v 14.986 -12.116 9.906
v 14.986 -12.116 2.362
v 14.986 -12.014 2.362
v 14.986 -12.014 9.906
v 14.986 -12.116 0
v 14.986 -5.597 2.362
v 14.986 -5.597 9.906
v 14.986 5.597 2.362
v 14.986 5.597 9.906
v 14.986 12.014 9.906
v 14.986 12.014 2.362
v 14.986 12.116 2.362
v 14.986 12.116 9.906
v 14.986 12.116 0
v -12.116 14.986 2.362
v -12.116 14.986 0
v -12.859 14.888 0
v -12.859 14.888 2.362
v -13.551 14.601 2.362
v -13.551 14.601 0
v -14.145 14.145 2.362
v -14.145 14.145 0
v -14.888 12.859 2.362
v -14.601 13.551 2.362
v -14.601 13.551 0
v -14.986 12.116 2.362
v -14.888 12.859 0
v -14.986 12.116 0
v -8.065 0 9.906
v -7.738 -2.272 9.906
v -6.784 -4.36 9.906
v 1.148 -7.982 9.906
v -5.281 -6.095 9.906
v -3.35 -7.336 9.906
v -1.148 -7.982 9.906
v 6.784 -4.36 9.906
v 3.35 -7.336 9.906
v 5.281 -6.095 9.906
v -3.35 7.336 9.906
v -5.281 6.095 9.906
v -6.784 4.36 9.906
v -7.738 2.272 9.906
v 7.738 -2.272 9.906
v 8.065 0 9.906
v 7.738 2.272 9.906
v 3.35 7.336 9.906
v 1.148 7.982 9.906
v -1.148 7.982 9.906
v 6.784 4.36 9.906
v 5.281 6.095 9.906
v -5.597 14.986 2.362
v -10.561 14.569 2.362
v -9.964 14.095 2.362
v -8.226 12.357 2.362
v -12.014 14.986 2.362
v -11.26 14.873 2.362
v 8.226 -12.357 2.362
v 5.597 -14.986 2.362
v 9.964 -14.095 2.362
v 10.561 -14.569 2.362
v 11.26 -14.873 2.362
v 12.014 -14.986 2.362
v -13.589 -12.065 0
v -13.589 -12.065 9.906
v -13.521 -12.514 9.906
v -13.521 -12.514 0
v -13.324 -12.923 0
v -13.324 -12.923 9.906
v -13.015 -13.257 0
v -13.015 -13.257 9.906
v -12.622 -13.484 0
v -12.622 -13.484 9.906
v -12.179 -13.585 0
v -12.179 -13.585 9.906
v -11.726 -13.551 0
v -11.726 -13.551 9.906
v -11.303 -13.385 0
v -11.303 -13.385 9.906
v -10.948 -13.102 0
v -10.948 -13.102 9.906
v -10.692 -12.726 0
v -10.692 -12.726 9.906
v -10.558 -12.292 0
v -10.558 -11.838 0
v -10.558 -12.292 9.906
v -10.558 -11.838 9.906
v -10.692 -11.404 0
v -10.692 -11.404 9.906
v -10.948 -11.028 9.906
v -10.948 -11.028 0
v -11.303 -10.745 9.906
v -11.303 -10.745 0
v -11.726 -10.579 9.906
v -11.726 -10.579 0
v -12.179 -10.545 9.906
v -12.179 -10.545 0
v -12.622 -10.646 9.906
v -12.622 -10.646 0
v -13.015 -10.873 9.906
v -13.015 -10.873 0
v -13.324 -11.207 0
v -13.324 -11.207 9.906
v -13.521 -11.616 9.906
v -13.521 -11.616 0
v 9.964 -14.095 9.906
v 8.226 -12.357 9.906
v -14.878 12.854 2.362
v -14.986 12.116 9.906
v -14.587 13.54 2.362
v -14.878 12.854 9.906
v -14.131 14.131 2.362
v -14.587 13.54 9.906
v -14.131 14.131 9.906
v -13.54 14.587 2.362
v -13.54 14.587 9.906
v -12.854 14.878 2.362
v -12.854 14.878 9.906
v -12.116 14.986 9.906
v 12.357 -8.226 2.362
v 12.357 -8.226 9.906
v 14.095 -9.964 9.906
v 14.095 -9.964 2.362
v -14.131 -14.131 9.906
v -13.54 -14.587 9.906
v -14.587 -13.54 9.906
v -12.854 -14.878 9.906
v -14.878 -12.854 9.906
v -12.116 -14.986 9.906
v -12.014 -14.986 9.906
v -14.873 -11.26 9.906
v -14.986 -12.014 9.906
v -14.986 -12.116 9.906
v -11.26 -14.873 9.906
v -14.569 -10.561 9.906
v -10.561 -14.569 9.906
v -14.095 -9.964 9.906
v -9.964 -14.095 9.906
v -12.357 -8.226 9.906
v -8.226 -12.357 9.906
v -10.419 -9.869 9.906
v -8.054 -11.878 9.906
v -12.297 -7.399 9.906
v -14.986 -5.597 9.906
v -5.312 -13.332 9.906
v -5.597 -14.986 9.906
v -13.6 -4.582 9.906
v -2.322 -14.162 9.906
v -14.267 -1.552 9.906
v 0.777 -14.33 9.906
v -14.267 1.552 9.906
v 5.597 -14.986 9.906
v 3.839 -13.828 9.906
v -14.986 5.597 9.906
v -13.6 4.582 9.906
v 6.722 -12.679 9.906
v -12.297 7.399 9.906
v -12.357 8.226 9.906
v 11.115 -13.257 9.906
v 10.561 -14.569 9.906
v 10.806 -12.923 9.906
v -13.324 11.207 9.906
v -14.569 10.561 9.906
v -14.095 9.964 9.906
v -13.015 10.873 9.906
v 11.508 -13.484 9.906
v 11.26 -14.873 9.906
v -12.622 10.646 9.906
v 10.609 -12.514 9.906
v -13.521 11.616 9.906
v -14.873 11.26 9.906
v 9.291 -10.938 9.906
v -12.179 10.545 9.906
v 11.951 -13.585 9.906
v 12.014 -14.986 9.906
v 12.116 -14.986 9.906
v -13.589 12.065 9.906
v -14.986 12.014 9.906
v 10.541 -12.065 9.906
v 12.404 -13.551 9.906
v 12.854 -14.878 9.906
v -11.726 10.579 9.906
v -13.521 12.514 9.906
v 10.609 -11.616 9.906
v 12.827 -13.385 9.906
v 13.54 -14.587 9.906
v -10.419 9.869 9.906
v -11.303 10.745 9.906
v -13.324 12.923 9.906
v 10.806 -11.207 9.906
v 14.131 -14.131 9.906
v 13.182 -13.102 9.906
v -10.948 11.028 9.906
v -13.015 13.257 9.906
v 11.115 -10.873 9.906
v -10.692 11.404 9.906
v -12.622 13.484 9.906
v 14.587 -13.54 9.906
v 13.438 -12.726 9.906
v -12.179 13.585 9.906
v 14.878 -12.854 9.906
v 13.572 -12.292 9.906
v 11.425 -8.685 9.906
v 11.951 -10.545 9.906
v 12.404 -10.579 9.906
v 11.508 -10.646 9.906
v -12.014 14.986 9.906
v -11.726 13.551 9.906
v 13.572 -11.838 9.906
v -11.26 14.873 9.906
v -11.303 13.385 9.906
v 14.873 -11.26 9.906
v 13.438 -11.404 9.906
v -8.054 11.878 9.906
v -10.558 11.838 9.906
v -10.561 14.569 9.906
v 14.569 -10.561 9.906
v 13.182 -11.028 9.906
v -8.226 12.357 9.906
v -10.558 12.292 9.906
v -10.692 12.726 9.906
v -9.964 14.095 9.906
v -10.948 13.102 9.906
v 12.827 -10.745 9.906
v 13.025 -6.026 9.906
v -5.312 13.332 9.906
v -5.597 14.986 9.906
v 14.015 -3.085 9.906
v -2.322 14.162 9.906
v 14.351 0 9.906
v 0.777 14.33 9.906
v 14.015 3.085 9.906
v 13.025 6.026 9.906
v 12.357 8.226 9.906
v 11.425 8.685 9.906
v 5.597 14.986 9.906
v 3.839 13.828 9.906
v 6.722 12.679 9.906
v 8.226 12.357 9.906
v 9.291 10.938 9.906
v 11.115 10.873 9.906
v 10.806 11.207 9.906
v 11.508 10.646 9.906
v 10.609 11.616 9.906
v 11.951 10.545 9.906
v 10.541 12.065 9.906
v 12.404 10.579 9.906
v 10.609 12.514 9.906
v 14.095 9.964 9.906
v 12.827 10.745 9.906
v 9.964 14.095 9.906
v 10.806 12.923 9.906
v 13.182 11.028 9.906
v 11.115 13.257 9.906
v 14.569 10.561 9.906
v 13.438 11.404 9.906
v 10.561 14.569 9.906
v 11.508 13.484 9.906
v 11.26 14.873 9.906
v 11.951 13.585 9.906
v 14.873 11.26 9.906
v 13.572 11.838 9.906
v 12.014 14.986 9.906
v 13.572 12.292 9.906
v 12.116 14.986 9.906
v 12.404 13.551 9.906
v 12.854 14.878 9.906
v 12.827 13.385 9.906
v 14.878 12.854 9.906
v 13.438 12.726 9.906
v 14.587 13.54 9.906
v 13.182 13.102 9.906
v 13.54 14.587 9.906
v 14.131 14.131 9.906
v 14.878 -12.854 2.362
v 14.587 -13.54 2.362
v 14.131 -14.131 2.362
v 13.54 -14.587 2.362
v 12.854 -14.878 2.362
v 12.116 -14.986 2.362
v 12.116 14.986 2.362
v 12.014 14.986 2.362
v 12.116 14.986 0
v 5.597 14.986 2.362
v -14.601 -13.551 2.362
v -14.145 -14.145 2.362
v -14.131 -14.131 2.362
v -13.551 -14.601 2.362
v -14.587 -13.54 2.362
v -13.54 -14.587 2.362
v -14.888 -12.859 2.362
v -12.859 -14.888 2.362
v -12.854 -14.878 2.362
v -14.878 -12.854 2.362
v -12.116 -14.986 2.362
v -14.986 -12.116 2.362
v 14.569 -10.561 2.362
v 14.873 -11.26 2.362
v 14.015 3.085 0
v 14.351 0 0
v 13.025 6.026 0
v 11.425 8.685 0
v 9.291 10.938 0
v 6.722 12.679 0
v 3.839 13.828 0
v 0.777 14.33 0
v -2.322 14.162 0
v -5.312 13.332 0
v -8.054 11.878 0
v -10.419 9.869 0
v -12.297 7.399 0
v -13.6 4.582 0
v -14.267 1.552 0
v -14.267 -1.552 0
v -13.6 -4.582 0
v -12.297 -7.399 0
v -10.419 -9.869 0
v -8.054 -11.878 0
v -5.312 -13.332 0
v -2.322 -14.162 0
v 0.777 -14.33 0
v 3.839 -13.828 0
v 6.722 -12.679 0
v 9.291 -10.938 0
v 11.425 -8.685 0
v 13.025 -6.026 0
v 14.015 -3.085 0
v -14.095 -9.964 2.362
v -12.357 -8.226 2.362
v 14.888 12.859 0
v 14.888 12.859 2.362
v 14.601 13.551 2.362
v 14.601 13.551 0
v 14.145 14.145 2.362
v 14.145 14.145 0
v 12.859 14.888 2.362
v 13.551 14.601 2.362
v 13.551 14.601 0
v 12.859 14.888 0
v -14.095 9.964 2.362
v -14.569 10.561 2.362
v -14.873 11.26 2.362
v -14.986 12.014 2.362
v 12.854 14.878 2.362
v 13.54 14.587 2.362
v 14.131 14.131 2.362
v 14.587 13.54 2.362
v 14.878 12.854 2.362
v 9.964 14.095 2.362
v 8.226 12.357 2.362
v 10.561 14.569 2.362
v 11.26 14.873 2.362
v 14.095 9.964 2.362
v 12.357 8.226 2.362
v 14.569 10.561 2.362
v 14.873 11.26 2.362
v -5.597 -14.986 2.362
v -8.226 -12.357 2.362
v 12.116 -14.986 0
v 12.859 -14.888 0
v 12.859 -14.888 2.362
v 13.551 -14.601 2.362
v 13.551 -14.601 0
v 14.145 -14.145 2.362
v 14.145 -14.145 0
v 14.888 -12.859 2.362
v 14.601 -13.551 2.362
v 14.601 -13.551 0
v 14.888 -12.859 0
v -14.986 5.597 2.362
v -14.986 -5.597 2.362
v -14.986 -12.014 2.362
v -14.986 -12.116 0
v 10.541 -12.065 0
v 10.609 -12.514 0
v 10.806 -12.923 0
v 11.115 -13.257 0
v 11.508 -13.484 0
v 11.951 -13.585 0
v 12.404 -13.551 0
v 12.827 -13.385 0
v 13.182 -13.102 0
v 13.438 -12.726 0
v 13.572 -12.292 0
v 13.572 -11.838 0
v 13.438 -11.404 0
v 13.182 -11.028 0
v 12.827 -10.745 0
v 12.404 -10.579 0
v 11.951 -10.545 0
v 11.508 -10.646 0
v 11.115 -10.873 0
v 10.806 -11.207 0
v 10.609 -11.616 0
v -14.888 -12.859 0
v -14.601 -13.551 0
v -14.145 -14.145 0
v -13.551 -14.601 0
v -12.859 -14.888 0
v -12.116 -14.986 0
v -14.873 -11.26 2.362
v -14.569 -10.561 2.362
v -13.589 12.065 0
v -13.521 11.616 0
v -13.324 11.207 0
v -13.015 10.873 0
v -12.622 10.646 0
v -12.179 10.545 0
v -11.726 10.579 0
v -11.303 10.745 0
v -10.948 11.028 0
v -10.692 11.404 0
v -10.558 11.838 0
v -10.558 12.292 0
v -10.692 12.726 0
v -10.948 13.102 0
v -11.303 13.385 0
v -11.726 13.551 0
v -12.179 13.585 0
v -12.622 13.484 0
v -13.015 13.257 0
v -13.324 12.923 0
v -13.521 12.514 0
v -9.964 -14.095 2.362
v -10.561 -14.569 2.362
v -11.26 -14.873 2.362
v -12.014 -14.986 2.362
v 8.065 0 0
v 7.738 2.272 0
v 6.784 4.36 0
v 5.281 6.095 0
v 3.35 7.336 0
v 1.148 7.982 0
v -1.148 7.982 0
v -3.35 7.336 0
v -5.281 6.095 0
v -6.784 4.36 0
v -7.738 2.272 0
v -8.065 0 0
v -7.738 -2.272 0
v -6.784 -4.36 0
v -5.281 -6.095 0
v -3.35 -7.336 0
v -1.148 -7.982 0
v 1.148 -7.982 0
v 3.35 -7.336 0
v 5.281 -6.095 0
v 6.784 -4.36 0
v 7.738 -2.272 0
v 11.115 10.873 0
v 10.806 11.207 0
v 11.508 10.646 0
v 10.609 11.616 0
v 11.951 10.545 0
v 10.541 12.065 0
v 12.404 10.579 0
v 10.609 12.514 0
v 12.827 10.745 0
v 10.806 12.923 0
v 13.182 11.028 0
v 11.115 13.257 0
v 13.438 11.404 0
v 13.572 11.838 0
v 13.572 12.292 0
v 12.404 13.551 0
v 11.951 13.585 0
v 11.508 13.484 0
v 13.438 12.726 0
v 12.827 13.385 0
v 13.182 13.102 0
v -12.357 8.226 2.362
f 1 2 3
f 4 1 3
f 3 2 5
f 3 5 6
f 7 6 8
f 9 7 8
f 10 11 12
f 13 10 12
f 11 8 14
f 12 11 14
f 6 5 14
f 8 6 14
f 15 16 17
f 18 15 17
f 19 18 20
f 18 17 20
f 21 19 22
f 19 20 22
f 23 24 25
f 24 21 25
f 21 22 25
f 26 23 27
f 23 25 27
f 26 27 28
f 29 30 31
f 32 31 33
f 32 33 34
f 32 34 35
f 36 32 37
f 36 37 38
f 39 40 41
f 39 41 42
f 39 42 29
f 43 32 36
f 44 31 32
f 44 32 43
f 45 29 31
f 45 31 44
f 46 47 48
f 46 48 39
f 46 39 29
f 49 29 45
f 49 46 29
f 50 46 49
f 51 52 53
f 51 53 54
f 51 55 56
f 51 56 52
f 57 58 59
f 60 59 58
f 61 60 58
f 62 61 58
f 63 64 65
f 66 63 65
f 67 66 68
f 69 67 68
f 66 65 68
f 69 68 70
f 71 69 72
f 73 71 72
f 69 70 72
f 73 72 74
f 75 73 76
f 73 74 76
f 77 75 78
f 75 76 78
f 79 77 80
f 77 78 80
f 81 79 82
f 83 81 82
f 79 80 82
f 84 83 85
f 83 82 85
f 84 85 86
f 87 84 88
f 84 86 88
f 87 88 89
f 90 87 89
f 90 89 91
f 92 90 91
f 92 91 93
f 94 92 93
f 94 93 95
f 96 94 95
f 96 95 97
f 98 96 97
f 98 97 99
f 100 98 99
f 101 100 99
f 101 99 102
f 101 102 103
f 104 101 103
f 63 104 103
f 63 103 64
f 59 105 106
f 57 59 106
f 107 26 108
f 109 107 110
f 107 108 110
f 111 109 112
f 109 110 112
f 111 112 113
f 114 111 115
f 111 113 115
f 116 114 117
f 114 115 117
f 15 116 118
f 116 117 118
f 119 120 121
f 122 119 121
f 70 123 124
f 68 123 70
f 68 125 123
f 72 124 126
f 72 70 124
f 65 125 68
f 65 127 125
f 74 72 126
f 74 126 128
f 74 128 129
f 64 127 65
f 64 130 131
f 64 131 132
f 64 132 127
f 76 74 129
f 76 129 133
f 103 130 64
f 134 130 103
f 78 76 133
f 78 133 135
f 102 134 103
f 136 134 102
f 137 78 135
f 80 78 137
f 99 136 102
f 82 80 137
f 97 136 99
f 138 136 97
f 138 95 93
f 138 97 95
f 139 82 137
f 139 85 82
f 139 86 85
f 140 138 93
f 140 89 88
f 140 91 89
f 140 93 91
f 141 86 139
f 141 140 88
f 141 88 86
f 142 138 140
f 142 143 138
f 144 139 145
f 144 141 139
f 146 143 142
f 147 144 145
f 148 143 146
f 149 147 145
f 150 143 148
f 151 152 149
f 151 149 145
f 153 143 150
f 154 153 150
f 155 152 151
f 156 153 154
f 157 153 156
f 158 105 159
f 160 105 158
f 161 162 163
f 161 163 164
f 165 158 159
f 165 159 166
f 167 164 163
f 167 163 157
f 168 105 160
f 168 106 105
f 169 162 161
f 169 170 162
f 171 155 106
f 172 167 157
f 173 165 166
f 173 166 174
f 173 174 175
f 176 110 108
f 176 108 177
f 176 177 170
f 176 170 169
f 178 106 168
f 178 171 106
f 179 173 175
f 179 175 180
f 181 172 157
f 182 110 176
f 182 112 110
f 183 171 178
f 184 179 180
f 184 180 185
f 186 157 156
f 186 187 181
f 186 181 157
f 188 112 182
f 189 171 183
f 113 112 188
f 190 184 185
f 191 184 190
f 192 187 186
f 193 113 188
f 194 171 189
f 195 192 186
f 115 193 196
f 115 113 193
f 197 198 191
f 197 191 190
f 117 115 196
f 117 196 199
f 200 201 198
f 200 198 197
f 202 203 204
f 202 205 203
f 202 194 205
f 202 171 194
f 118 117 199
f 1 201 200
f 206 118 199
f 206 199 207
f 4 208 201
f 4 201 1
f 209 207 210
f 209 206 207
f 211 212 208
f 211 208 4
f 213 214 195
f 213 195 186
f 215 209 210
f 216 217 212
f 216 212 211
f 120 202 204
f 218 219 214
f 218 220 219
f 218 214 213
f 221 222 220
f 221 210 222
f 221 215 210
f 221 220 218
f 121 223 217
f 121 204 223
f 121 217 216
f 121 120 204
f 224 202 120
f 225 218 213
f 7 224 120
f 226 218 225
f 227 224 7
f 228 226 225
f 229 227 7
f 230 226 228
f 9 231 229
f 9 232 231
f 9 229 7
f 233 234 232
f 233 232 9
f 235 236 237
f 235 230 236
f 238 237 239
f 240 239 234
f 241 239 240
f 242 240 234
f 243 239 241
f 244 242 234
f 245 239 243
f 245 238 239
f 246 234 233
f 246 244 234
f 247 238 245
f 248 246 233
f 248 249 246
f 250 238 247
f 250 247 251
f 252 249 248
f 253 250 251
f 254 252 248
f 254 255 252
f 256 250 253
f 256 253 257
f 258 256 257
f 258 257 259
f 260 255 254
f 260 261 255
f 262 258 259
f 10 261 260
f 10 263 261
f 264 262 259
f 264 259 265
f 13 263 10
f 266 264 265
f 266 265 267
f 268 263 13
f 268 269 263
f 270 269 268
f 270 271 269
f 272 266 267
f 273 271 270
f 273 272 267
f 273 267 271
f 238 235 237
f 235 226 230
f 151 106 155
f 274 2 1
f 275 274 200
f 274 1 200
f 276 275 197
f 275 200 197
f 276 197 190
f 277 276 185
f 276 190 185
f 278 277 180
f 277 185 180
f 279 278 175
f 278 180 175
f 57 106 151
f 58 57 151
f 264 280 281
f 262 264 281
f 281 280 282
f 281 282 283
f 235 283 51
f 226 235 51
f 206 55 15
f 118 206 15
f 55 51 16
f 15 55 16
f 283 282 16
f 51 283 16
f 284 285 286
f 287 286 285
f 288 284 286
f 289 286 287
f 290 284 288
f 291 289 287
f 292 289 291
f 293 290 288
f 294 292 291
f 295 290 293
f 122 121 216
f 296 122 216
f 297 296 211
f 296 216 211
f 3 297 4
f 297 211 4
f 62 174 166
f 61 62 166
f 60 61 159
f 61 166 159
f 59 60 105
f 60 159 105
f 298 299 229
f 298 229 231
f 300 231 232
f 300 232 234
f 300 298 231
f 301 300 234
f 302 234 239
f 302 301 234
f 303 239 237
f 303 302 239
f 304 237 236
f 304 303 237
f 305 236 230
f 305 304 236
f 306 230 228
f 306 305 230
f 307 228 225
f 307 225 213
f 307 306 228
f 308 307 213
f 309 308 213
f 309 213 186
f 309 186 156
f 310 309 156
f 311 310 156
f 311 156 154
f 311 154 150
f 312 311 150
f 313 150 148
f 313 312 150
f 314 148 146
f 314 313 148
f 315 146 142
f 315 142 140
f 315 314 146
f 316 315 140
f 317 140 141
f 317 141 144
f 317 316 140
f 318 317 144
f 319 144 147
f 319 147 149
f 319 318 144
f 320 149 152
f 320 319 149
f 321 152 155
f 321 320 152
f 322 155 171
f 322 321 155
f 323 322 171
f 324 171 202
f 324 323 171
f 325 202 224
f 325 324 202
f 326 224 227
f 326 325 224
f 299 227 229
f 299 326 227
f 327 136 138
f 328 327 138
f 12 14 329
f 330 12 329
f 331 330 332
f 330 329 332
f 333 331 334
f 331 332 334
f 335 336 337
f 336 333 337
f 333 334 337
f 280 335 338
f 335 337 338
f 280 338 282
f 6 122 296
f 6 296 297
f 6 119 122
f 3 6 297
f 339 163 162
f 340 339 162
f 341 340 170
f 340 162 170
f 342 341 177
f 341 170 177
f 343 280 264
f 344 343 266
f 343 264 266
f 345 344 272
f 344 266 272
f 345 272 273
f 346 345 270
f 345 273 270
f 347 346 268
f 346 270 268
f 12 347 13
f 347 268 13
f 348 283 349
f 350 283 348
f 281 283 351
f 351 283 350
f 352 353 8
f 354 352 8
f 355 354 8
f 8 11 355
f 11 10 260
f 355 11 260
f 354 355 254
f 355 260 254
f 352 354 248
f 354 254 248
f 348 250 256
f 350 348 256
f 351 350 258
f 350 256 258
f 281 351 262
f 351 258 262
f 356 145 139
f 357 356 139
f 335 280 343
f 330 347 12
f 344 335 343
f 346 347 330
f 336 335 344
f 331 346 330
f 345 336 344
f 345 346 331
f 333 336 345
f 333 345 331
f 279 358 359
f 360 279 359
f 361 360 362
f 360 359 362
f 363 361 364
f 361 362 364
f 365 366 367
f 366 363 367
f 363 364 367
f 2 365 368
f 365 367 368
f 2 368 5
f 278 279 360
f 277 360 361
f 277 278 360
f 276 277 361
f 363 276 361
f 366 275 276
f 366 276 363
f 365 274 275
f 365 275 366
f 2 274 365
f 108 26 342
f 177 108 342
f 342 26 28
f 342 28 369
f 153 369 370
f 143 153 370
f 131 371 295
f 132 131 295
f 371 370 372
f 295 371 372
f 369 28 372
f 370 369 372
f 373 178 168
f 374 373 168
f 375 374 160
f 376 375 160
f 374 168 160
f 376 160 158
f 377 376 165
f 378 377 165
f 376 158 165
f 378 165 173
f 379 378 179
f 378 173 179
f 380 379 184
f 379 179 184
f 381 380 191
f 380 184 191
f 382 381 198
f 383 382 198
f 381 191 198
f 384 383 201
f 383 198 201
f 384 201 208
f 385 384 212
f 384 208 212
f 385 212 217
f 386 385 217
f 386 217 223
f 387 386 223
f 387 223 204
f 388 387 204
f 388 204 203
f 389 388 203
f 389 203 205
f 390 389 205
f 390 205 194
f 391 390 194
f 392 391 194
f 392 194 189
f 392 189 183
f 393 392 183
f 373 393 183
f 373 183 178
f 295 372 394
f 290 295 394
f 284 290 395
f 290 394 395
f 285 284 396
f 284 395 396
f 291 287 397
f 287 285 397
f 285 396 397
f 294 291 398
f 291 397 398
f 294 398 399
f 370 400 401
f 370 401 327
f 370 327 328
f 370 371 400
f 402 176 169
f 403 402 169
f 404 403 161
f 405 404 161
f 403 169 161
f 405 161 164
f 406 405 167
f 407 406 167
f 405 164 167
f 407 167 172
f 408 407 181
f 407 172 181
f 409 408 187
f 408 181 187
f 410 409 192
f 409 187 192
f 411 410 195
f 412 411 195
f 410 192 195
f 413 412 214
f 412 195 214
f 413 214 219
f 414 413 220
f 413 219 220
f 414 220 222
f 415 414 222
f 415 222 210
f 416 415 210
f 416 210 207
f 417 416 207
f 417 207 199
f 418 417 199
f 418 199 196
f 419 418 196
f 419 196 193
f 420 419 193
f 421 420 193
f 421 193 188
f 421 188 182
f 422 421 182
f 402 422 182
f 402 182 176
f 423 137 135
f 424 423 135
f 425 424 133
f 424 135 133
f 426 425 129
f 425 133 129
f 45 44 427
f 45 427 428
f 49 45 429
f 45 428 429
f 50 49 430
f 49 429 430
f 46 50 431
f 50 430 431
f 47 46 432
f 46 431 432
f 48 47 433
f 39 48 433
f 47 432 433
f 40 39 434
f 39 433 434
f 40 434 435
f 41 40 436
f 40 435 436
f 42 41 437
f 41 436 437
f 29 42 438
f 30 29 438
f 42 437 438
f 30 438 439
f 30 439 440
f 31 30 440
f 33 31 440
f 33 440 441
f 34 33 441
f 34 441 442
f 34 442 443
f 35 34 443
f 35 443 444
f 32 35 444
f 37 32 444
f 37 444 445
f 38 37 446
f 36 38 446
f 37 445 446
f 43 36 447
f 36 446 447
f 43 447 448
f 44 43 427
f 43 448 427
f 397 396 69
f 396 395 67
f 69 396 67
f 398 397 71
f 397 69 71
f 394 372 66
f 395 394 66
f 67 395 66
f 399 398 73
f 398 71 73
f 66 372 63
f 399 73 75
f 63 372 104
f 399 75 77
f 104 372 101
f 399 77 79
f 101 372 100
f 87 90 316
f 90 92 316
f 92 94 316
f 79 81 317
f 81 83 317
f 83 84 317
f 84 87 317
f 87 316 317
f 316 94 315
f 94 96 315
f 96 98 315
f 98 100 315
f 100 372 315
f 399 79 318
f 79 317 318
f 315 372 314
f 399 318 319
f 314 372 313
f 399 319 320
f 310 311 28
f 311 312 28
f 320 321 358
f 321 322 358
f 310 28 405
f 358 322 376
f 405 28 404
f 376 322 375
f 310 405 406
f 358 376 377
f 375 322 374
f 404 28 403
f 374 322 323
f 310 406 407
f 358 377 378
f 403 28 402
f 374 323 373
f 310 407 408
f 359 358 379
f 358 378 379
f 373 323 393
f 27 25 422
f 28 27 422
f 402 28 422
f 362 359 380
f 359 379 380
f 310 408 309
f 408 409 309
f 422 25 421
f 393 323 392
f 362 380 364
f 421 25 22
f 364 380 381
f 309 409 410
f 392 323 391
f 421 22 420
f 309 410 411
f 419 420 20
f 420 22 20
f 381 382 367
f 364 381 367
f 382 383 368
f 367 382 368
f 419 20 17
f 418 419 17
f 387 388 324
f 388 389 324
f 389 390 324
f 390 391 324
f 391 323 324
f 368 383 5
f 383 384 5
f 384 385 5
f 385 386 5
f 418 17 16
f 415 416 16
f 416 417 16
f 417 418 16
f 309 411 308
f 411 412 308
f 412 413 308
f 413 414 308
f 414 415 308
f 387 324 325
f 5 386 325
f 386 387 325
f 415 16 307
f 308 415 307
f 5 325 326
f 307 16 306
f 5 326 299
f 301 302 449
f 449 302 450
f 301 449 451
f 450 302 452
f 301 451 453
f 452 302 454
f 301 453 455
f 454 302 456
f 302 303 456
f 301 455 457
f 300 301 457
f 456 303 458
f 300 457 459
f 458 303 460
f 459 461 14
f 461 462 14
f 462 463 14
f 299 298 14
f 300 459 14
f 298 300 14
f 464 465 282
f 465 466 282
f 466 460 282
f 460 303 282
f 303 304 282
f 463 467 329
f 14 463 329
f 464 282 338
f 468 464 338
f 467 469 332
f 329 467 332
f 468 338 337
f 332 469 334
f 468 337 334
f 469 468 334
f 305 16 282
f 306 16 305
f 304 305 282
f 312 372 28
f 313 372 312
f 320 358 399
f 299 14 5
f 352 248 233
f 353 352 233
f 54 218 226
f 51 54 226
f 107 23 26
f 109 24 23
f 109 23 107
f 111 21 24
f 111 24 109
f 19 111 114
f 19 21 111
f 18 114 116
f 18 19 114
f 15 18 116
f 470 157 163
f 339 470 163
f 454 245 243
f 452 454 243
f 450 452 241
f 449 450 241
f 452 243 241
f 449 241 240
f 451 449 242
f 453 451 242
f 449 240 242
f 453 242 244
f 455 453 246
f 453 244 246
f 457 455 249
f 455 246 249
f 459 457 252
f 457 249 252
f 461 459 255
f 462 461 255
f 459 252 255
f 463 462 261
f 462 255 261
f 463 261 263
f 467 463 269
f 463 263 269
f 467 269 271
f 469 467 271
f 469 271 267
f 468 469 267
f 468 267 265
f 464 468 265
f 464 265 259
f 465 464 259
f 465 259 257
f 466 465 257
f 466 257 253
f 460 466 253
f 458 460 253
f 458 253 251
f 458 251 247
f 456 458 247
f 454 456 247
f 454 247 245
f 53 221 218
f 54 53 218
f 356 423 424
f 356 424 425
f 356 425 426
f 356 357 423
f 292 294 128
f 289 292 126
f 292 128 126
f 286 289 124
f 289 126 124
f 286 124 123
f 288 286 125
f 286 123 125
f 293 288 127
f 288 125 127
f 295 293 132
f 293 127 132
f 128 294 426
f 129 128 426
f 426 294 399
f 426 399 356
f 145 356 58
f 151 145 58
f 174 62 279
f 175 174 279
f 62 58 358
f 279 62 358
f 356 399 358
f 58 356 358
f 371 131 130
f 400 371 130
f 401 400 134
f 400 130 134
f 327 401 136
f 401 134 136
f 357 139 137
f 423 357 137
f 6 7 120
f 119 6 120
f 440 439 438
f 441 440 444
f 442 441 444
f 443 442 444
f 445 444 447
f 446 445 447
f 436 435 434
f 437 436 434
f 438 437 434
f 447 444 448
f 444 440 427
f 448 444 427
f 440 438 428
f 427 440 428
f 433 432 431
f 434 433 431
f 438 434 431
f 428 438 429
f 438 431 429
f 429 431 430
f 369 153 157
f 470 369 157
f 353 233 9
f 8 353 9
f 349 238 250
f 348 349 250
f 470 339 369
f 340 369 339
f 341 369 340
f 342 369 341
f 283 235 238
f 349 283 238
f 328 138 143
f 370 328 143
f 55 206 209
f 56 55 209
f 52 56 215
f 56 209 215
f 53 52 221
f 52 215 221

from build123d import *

# Parameters (mm, degrees)
F0_R     = 14.351
F1_DEPTH = 9.906
F2_W     = 35.827614
F2_H     = 36.253556
F3_DEPTH = 7.5438
F4_D     = 3.048
F5_R     = 8.0645
F6_DEPTH = 9.906


with BuildPart() as f1:
    # F0 (on Top) → F1 (new body)
    with BuildSketch(Plane.XY):
        with BuildLine():
            Line((12.1158, 14.986), (-12.1158, 14.986))
            ThreePointArc((-12.1158, 14.986), (-14.145338, 14.145338), (-14.986, 12.1158))
            Line((-14.986, 12.1158), (-14.986, -12.1158))
            ThreePointArc((-14.986, -12.1158), (-14.145338, -14.145338), (-12.1158, -14.986))
            Line((-12.1158, -14.986), (12.1158, -14.986))
            ThreePointArc((12.1158, -14.986), (14.145338, -14.145338), (14.986, -12.1158))
            Line((14.986, -12.1158), (14.986, 12.1158))
            ThreePointArc((14.986, 12.1158), (14.145338, 14.145338), (12.1158, 14.986))
        make_face()
        Circle(F0_R, mode=Mode.SUBTRACT)
    extrude(amount=F1_DEPTH)

    # F2 (on face) → F3 (cut)
    with BuildSketch(Plane.XY.offset(9.906)):
        with BuildLine():
            Line((-8.225915, 12.356832), (-9.96362, 14.094538))
            ThreePointArc((-9.96362, 14.094538), (-14.130771, 14.130771), (-14.094538, 9.96362))
            Line((-14.094538, 9.96362), (-12.356832, 8.225915))
            Line((-12.356832, 8.225915), (-14.986, 5.596747))
            Line((-14.986, 5.596747), (-14.986, -5.596747))
            Line((-14.986, -5.596747), (-12.356832, -8.225915))
            Line((-12.356832, -8.225915), (-14.094538, -9.96362))
            ThreePointArc((-14.094538, -9.96362), (-14.130771, -14.130771), (-9.96362, -14.094538))
            Line((-9.96362, -14.094538), (-8.225915, -12.356832))
            Line((-8.225915, -12.356832), (-5.596747, -14.986))
            Line((-5.596747, -14.986), (5.596747, -14.986))
            Line((5.596747, -14.986), (8.225915, -12.356832))
            Line((8.225915, -12.356832), (9.96362, -14.094538))
            ThreePointArc((9.96362, -14.094538), (14.130771, -14.130771), (14.094538, -9.96362))
            Line((14.094538, -9.96362), (12.356832, -8.225915))
            Line((12.356832, -8.225915), (14.986, -5.596747))
            Line((14.986, -5.596747), (14.986, 5.596747))
            Line((14.986, 5.596747), (12.356832, 8.225915))
            Line((12.356832, 8.225915), (14.094538, 9.96362))
            ThreePointArc((14.094538, 9.96362), (14.130771, 14.130771), (9.96362, 14.094538))
            Line((9.96362, 14.094538), (8.225915, 12.356832))
            Line((8.225915, 12.356832), (5.596747, 14.986))
            Line((5.596747, 14.986), (-5.596747, 14.986))
            Line((-5.596747, 14.986), (-8.225915, 12.356832))
        make_face()
        Rectangle(F2_W, F2_H)
        with BuildLine():
            ThreePointArc((-14.094538, 9.96362), (-14.130771, 14.130771), (-9.96362, 14.094538))
            Line((-9.96362, 14.094538), (-8.225915, 12.356832))
            Line((-8.225915, 12.356832), (-5.596747, 14.986))
            Line((-5.596747, 14.986), (5.596747, 14.986))
            Line((5.596747, 14.986), (8.225915, 12.356832))
            Line((8.225915, 12.356832), (9.96362, 14.094538))
            ThreePointArc((9.96362, 14.094538), (14.130771, 14.130771), (14.094538, 9.96362))
            Line((14.094538, 9.96362), (12.356832, 8.225915))
            Line((12.356832, 8.225915), (14.986, 5.596747))
            Line((14.986, 5.596747), (14.986, -5.596747))
            Line((14.986, -5.596747), (12.356832, -8.225915))
            Line((12.356832, -8.225915), (14.094538, -9.96362))
            ThreePointArc((14.094538, -9.96362), (14.130771, -14.130771), (9.96362, -14.094538))
            Line((9.96362, -14.094538), (8.225915, -12.356832))
            Line((8.225915, -12.356832), (5.596747, -14.986))
            Line((5.596747, -14.986), (-5.596747, -14.986))
            Line((-5.596747, -14.986), (-8.225915, -12.356832))
            Line((-8.225915, -12.356832), (-9.96362, -14.094538))
            ThreePointArc((-9.96362, -14.094538), (-14.130771, -14.130771), (-14.094538, -9.96362))
            Line((-14.094538, -9.96362), (-12.356832, -8.225915))
            Line((-12.356832, -8.225915), (-14.986, -5.596747))
            Line((-14.986, -5.596747), (-14.986, 5.596747))
            Line((-14.986, 5.596747), (-12.356832, 8.225915))
            Line((-12.356832, 8.225915), (-14.094538, 9.96362))
        make_face(mode=Mode.SUBTRACT)
    extrude(amount=-F3_DEPTH, mode=Mode.SUBTRACT)

    # F4 (through all)
    with Locations(Plane(origin=(0, 0, 0), x_dir=(1, 0, 0), z_dir=(0, 0, -1))):
        with Locations((-12.065, 12.065), (12.065, 12.065), (12.065, -12.065), (-12.065, -12.065)):
            Hole(F4_D / 2)


with BuildPart() as f6:
    # F5 (on Top) → F6 (new body)
    with BuildSketch(Plane.XY):
        Circle(F5_R)
    extrude(amount=F6_DEPTH)


solid = Compound([f1.part, f6.part])
